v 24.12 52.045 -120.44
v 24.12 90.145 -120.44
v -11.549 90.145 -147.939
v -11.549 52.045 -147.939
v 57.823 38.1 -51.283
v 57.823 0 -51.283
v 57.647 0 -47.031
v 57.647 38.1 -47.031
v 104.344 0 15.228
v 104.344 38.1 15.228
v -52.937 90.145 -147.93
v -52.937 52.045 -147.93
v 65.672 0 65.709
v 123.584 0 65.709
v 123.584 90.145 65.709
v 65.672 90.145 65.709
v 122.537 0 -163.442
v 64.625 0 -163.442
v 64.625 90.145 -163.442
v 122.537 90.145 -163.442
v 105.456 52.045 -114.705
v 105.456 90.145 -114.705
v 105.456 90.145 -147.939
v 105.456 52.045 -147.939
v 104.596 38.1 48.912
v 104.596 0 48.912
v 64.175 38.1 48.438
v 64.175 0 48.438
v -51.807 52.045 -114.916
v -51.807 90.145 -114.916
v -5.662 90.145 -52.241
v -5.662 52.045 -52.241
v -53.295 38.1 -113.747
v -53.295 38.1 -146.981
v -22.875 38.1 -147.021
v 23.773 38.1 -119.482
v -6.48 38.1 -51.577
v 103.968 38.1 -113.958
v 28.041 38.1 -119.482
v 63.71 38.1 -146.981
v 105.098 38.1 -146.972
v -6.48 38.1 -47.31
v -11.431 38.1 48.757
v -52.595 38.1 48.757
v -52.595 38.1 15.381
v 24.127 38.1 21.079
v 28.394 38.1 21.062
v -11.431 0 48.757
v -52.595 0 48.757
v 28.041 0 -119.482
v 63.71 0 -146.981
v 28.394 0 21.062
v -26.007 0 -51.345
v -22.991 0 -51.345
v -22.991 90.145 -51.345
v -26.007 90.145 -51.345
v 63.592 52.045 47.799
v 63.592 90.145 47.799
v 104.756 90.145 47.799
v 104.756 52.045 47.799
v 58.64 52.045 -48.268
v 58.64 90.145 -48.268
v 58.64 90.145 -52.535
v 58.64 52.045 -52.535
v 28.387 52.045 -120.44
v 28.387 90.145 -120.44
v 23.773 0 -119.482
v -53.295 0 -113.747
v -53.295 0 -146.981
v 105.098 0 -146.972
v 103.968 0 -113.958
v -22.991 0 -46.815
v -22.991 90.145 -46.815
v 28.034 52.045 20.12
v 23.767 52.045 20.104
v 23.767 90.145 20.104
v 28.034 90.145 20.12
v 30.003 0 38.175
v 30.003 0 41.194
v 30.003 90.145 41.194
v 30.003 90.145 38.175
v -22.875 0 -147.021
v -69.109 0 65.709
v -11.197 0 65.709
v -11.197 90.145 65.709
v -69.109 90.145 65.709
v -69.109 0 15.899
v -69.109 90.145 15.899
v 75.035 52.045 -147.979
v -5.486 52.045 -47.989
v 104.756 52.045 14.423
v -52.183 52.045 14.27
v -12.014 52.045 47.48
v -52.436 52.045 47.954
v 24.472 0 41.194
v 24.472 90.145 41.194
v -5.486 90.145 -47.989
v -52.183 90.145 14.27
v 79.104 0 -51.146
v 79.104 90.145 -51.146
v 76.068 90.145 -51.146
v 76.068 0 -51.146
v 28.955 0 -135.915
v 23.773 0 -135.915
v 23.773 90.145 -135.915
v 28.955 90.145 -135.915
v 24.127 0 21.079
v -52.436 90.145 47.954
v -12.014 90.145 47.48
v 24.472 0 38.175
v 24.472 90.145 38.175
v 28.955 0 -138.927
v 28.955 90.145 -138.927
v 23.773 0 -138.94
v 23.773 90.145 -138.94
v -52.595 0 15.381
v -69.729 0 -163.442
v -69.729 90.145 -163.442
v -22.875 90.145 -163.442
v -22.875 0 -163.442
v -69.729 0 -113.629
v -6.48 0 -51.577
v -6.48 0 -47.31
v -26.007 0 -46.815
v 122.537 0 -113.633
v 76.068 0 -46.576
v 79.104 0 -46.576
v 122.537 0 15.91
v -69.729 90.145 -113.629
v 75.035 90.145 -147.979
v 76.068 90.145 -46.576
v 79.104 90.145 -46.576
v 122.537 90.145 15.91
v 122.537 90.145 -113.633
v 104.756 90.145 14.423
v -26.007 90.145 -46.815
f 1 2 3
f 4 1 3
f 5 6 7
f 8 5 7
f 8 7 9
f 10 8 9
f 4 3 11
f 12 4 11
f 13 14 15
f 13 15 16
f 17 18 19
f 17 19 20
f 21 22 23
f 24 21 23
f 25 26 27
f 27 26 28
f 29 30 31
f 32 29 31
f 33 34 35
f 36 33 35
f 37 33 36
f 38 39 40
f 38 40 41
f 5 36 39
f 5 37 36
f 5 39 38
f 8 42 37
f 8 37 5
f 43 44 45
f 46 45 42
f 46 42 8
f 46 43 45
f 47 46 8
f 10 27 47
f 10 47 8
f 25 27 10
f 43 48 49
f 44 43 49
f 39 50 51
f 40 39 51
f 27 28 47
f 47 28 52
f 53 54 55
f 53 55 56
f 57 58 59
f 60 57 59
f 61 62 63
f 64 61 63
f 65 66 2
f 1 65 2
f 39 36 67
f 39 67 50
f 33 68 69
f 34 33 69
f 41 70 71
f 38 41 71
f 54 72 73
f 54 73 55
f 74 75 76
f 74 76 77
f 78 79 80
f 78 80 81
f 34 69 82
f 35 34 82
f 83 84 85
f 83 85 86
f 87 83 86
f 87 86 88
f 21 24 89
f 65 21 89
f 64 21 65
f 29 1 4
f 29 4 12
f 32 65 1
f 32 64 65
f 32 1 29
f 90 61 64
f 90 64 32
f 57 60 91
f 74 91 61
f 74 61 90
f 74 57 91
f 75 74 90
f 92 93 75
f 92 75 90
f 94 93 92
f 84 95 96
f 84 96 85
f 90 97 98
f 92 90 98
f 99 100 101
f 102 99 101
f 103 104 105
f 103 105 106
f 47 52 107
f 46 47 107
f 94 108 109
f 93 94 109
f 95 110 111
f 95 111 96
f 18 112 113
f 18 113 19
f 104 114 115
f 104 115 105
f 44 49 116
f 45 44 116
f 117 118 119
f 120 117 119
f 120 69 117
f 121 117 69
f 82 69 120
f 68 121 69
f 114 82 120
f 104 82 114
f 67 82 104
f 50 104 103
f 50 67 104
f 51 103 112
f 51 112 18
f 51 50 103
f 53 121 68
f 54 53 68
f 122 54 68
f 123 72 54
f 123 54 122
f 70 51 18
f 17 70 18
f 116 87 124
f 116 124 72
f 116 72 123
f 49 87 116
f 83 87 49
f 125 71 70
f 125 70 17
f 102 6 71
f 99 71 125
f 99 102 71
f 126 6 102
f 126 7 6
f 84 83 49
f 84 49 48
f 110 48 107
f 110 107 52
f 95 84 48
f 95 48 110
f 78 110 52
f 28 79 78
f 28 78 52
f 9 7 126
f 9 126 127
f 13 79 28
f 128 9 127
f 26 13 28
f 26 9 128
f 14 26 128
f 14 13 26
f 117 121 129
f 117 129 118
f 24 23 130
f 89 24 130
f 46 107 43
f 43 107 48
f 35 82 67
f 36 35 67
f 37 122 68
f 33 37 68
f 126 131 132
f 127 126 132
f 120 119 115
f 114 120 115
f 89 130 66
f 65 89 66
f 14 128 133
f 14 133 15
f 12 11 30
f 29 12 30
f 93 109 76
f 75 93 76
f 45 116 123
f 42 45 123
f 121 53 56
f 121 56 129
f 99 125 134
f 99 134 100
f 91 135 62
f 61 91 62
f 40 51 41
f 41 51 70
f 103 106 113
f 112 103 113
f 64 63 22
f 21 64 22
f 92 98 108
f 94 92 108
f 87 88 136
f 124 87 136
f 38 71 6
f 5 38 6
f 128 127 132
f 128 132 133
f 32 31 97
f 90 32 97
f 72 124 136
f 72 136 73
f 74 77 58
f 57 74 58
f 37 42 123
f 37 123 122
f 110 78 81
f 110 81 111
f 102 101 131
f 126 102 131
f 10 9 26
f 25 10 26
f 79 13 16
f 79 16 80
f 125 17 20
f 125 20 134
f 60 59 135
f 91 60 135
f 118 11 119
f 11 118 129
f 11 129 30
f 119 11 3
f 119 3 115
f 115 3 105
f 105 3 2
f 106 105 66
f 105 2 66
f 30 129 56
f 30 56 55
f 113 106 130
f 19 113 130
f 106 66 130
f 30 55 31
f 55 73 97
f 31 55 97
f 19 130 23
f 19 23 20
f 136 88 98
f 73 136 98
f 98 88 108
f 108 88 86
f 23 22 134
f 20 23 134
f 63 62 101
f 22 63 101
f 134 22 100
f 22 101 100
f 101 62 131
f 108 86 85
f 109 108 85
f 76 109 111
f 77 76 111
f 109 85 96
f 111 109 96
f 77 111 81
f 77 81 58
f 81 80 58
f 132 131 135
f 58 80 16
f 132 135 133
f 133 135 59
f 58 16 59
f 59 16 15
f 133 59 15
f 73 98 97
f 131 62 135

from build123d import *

# Parameters (mm, degrees)
F1_DEPTH = 90.1446
F4_DEPTH = 38.1
F7_DEPTH = 38.1


with BuildPart() as f1:
    # F0 (on Front) → F1 (new body)
    with BuildSketch(Plane.XZ):
        Polygon((-11.1971926081, 65.7086565368), (-69.1091926081, 65.7086565368), (-69.1091926081, 15.8992565368), (-26.0065842281, -46.8154278155), (-22.9906474179, -46.8154278155), (-22.9906474179, -51.3447030535), (-26.0065842281, -51.3447030535), (-69.729202812, -113.6287227273), (-69.729202812, -163.4422105699), (-22.8745764246, -163.4422105699), (23.7734285709, -138.940374625), (23.7734285709, -135.9147534492), (28.9550285709, -135.9147534492), (28.9550285709, -138.9272423858), (64.6245286164, -163.4422105699), (122.5365286164, -163.4422105699), (122.5365286164, -113.6328105699), (79.1036308243, -51.1464130746), (76.0683308243, -51.1464130746), (76.0683308243, -46.5761250044), (79.1036308243, -46.5761250044), (122.5365286164, 15.9102724908), (123.5840374592, 65.7086565368), (65.6720374592, 65.7086565368), (30.0025374137, 41.1936883527), (30.0025374137, 38.175295005), (24.4723074374, 38.175295005), (24.4723074374, 41.1936883527), align=None)
    extrude(amount=-F1_DEPTH)

    # F3 (on offset) → F4 (cut)
    with BuildSketch(Plane.XZ):
        Polygon((-6.4795594404, -51.5769487249), (-53.295402812, -113.7468837801), (-53.295402812, -146.9806581736), (-22.8745764246, -147.0209074169), (23.7734285709, -119.4822192192), (28.0406285709, -119.4822192192), (63.7101286164, -146.9806581736), (105.0975570712, -146.9717806065), (103.9679117275, -113.9575218417), (57.8230765612, -51.2830203653), (57.6468469615, -47.0311700371), (104.3438033673, 15.2281126267), (104.5963698348, 48.9120816117), (64.1748463129, 48.43781649), (28.3937643672, 21.0621996767), (24.126596129, 21.0786637873), (-11.4306816807, 48.7568000231), (-52.5953805913, 48.7568000231), (-52.5953805913, 15.3812000231), (-6.4795594404, -47.3097487249), align=None)
    extrude(amount=-F4_DEPTH, mode=Mode.SUBTRACT)

    # F6 (on offset) → F7 (cut)
    with BuildSketch(Plane(origin=(0, 90.1446, 0), x_dir=(-1, 0, 0), z_dir=(0, 1, 0))):
        Polygon((-58.6403822024, -52.5351678955), (-105.456225574, -114.7051029507), (-105.456225574, -147.9388773441), (-75.0353991867, -147.9791265874), (-28.3873941911, -120.4404383898), (-24.1201941911, -120.4404383898), (11.5493058543, -147.9388773441), (52.9367343092, -147.9299997771), (51.8070889654, -114.9157410123), (5.6622537992, -52.2412395359), (5.4860241995, -47.9893892076), (52.1829806052, 14.2698934561), (52.4355470727, 47.9538624411), (12.0140235509, 47.4795973194), (-23.7670583948, 20.1039805062), (-28.034226633, 20.1204446167), (-63.5915044428, 47.7985808526), (-104.7562033534, 47.7985808526), (-104.7562033534, 14.4229808526), (-58.6403822024, -48.2679678955), align=None)
    extrude(amount=-F7_DEPTH, mode=Mode.SUBTRACT)


solid = f1.part
